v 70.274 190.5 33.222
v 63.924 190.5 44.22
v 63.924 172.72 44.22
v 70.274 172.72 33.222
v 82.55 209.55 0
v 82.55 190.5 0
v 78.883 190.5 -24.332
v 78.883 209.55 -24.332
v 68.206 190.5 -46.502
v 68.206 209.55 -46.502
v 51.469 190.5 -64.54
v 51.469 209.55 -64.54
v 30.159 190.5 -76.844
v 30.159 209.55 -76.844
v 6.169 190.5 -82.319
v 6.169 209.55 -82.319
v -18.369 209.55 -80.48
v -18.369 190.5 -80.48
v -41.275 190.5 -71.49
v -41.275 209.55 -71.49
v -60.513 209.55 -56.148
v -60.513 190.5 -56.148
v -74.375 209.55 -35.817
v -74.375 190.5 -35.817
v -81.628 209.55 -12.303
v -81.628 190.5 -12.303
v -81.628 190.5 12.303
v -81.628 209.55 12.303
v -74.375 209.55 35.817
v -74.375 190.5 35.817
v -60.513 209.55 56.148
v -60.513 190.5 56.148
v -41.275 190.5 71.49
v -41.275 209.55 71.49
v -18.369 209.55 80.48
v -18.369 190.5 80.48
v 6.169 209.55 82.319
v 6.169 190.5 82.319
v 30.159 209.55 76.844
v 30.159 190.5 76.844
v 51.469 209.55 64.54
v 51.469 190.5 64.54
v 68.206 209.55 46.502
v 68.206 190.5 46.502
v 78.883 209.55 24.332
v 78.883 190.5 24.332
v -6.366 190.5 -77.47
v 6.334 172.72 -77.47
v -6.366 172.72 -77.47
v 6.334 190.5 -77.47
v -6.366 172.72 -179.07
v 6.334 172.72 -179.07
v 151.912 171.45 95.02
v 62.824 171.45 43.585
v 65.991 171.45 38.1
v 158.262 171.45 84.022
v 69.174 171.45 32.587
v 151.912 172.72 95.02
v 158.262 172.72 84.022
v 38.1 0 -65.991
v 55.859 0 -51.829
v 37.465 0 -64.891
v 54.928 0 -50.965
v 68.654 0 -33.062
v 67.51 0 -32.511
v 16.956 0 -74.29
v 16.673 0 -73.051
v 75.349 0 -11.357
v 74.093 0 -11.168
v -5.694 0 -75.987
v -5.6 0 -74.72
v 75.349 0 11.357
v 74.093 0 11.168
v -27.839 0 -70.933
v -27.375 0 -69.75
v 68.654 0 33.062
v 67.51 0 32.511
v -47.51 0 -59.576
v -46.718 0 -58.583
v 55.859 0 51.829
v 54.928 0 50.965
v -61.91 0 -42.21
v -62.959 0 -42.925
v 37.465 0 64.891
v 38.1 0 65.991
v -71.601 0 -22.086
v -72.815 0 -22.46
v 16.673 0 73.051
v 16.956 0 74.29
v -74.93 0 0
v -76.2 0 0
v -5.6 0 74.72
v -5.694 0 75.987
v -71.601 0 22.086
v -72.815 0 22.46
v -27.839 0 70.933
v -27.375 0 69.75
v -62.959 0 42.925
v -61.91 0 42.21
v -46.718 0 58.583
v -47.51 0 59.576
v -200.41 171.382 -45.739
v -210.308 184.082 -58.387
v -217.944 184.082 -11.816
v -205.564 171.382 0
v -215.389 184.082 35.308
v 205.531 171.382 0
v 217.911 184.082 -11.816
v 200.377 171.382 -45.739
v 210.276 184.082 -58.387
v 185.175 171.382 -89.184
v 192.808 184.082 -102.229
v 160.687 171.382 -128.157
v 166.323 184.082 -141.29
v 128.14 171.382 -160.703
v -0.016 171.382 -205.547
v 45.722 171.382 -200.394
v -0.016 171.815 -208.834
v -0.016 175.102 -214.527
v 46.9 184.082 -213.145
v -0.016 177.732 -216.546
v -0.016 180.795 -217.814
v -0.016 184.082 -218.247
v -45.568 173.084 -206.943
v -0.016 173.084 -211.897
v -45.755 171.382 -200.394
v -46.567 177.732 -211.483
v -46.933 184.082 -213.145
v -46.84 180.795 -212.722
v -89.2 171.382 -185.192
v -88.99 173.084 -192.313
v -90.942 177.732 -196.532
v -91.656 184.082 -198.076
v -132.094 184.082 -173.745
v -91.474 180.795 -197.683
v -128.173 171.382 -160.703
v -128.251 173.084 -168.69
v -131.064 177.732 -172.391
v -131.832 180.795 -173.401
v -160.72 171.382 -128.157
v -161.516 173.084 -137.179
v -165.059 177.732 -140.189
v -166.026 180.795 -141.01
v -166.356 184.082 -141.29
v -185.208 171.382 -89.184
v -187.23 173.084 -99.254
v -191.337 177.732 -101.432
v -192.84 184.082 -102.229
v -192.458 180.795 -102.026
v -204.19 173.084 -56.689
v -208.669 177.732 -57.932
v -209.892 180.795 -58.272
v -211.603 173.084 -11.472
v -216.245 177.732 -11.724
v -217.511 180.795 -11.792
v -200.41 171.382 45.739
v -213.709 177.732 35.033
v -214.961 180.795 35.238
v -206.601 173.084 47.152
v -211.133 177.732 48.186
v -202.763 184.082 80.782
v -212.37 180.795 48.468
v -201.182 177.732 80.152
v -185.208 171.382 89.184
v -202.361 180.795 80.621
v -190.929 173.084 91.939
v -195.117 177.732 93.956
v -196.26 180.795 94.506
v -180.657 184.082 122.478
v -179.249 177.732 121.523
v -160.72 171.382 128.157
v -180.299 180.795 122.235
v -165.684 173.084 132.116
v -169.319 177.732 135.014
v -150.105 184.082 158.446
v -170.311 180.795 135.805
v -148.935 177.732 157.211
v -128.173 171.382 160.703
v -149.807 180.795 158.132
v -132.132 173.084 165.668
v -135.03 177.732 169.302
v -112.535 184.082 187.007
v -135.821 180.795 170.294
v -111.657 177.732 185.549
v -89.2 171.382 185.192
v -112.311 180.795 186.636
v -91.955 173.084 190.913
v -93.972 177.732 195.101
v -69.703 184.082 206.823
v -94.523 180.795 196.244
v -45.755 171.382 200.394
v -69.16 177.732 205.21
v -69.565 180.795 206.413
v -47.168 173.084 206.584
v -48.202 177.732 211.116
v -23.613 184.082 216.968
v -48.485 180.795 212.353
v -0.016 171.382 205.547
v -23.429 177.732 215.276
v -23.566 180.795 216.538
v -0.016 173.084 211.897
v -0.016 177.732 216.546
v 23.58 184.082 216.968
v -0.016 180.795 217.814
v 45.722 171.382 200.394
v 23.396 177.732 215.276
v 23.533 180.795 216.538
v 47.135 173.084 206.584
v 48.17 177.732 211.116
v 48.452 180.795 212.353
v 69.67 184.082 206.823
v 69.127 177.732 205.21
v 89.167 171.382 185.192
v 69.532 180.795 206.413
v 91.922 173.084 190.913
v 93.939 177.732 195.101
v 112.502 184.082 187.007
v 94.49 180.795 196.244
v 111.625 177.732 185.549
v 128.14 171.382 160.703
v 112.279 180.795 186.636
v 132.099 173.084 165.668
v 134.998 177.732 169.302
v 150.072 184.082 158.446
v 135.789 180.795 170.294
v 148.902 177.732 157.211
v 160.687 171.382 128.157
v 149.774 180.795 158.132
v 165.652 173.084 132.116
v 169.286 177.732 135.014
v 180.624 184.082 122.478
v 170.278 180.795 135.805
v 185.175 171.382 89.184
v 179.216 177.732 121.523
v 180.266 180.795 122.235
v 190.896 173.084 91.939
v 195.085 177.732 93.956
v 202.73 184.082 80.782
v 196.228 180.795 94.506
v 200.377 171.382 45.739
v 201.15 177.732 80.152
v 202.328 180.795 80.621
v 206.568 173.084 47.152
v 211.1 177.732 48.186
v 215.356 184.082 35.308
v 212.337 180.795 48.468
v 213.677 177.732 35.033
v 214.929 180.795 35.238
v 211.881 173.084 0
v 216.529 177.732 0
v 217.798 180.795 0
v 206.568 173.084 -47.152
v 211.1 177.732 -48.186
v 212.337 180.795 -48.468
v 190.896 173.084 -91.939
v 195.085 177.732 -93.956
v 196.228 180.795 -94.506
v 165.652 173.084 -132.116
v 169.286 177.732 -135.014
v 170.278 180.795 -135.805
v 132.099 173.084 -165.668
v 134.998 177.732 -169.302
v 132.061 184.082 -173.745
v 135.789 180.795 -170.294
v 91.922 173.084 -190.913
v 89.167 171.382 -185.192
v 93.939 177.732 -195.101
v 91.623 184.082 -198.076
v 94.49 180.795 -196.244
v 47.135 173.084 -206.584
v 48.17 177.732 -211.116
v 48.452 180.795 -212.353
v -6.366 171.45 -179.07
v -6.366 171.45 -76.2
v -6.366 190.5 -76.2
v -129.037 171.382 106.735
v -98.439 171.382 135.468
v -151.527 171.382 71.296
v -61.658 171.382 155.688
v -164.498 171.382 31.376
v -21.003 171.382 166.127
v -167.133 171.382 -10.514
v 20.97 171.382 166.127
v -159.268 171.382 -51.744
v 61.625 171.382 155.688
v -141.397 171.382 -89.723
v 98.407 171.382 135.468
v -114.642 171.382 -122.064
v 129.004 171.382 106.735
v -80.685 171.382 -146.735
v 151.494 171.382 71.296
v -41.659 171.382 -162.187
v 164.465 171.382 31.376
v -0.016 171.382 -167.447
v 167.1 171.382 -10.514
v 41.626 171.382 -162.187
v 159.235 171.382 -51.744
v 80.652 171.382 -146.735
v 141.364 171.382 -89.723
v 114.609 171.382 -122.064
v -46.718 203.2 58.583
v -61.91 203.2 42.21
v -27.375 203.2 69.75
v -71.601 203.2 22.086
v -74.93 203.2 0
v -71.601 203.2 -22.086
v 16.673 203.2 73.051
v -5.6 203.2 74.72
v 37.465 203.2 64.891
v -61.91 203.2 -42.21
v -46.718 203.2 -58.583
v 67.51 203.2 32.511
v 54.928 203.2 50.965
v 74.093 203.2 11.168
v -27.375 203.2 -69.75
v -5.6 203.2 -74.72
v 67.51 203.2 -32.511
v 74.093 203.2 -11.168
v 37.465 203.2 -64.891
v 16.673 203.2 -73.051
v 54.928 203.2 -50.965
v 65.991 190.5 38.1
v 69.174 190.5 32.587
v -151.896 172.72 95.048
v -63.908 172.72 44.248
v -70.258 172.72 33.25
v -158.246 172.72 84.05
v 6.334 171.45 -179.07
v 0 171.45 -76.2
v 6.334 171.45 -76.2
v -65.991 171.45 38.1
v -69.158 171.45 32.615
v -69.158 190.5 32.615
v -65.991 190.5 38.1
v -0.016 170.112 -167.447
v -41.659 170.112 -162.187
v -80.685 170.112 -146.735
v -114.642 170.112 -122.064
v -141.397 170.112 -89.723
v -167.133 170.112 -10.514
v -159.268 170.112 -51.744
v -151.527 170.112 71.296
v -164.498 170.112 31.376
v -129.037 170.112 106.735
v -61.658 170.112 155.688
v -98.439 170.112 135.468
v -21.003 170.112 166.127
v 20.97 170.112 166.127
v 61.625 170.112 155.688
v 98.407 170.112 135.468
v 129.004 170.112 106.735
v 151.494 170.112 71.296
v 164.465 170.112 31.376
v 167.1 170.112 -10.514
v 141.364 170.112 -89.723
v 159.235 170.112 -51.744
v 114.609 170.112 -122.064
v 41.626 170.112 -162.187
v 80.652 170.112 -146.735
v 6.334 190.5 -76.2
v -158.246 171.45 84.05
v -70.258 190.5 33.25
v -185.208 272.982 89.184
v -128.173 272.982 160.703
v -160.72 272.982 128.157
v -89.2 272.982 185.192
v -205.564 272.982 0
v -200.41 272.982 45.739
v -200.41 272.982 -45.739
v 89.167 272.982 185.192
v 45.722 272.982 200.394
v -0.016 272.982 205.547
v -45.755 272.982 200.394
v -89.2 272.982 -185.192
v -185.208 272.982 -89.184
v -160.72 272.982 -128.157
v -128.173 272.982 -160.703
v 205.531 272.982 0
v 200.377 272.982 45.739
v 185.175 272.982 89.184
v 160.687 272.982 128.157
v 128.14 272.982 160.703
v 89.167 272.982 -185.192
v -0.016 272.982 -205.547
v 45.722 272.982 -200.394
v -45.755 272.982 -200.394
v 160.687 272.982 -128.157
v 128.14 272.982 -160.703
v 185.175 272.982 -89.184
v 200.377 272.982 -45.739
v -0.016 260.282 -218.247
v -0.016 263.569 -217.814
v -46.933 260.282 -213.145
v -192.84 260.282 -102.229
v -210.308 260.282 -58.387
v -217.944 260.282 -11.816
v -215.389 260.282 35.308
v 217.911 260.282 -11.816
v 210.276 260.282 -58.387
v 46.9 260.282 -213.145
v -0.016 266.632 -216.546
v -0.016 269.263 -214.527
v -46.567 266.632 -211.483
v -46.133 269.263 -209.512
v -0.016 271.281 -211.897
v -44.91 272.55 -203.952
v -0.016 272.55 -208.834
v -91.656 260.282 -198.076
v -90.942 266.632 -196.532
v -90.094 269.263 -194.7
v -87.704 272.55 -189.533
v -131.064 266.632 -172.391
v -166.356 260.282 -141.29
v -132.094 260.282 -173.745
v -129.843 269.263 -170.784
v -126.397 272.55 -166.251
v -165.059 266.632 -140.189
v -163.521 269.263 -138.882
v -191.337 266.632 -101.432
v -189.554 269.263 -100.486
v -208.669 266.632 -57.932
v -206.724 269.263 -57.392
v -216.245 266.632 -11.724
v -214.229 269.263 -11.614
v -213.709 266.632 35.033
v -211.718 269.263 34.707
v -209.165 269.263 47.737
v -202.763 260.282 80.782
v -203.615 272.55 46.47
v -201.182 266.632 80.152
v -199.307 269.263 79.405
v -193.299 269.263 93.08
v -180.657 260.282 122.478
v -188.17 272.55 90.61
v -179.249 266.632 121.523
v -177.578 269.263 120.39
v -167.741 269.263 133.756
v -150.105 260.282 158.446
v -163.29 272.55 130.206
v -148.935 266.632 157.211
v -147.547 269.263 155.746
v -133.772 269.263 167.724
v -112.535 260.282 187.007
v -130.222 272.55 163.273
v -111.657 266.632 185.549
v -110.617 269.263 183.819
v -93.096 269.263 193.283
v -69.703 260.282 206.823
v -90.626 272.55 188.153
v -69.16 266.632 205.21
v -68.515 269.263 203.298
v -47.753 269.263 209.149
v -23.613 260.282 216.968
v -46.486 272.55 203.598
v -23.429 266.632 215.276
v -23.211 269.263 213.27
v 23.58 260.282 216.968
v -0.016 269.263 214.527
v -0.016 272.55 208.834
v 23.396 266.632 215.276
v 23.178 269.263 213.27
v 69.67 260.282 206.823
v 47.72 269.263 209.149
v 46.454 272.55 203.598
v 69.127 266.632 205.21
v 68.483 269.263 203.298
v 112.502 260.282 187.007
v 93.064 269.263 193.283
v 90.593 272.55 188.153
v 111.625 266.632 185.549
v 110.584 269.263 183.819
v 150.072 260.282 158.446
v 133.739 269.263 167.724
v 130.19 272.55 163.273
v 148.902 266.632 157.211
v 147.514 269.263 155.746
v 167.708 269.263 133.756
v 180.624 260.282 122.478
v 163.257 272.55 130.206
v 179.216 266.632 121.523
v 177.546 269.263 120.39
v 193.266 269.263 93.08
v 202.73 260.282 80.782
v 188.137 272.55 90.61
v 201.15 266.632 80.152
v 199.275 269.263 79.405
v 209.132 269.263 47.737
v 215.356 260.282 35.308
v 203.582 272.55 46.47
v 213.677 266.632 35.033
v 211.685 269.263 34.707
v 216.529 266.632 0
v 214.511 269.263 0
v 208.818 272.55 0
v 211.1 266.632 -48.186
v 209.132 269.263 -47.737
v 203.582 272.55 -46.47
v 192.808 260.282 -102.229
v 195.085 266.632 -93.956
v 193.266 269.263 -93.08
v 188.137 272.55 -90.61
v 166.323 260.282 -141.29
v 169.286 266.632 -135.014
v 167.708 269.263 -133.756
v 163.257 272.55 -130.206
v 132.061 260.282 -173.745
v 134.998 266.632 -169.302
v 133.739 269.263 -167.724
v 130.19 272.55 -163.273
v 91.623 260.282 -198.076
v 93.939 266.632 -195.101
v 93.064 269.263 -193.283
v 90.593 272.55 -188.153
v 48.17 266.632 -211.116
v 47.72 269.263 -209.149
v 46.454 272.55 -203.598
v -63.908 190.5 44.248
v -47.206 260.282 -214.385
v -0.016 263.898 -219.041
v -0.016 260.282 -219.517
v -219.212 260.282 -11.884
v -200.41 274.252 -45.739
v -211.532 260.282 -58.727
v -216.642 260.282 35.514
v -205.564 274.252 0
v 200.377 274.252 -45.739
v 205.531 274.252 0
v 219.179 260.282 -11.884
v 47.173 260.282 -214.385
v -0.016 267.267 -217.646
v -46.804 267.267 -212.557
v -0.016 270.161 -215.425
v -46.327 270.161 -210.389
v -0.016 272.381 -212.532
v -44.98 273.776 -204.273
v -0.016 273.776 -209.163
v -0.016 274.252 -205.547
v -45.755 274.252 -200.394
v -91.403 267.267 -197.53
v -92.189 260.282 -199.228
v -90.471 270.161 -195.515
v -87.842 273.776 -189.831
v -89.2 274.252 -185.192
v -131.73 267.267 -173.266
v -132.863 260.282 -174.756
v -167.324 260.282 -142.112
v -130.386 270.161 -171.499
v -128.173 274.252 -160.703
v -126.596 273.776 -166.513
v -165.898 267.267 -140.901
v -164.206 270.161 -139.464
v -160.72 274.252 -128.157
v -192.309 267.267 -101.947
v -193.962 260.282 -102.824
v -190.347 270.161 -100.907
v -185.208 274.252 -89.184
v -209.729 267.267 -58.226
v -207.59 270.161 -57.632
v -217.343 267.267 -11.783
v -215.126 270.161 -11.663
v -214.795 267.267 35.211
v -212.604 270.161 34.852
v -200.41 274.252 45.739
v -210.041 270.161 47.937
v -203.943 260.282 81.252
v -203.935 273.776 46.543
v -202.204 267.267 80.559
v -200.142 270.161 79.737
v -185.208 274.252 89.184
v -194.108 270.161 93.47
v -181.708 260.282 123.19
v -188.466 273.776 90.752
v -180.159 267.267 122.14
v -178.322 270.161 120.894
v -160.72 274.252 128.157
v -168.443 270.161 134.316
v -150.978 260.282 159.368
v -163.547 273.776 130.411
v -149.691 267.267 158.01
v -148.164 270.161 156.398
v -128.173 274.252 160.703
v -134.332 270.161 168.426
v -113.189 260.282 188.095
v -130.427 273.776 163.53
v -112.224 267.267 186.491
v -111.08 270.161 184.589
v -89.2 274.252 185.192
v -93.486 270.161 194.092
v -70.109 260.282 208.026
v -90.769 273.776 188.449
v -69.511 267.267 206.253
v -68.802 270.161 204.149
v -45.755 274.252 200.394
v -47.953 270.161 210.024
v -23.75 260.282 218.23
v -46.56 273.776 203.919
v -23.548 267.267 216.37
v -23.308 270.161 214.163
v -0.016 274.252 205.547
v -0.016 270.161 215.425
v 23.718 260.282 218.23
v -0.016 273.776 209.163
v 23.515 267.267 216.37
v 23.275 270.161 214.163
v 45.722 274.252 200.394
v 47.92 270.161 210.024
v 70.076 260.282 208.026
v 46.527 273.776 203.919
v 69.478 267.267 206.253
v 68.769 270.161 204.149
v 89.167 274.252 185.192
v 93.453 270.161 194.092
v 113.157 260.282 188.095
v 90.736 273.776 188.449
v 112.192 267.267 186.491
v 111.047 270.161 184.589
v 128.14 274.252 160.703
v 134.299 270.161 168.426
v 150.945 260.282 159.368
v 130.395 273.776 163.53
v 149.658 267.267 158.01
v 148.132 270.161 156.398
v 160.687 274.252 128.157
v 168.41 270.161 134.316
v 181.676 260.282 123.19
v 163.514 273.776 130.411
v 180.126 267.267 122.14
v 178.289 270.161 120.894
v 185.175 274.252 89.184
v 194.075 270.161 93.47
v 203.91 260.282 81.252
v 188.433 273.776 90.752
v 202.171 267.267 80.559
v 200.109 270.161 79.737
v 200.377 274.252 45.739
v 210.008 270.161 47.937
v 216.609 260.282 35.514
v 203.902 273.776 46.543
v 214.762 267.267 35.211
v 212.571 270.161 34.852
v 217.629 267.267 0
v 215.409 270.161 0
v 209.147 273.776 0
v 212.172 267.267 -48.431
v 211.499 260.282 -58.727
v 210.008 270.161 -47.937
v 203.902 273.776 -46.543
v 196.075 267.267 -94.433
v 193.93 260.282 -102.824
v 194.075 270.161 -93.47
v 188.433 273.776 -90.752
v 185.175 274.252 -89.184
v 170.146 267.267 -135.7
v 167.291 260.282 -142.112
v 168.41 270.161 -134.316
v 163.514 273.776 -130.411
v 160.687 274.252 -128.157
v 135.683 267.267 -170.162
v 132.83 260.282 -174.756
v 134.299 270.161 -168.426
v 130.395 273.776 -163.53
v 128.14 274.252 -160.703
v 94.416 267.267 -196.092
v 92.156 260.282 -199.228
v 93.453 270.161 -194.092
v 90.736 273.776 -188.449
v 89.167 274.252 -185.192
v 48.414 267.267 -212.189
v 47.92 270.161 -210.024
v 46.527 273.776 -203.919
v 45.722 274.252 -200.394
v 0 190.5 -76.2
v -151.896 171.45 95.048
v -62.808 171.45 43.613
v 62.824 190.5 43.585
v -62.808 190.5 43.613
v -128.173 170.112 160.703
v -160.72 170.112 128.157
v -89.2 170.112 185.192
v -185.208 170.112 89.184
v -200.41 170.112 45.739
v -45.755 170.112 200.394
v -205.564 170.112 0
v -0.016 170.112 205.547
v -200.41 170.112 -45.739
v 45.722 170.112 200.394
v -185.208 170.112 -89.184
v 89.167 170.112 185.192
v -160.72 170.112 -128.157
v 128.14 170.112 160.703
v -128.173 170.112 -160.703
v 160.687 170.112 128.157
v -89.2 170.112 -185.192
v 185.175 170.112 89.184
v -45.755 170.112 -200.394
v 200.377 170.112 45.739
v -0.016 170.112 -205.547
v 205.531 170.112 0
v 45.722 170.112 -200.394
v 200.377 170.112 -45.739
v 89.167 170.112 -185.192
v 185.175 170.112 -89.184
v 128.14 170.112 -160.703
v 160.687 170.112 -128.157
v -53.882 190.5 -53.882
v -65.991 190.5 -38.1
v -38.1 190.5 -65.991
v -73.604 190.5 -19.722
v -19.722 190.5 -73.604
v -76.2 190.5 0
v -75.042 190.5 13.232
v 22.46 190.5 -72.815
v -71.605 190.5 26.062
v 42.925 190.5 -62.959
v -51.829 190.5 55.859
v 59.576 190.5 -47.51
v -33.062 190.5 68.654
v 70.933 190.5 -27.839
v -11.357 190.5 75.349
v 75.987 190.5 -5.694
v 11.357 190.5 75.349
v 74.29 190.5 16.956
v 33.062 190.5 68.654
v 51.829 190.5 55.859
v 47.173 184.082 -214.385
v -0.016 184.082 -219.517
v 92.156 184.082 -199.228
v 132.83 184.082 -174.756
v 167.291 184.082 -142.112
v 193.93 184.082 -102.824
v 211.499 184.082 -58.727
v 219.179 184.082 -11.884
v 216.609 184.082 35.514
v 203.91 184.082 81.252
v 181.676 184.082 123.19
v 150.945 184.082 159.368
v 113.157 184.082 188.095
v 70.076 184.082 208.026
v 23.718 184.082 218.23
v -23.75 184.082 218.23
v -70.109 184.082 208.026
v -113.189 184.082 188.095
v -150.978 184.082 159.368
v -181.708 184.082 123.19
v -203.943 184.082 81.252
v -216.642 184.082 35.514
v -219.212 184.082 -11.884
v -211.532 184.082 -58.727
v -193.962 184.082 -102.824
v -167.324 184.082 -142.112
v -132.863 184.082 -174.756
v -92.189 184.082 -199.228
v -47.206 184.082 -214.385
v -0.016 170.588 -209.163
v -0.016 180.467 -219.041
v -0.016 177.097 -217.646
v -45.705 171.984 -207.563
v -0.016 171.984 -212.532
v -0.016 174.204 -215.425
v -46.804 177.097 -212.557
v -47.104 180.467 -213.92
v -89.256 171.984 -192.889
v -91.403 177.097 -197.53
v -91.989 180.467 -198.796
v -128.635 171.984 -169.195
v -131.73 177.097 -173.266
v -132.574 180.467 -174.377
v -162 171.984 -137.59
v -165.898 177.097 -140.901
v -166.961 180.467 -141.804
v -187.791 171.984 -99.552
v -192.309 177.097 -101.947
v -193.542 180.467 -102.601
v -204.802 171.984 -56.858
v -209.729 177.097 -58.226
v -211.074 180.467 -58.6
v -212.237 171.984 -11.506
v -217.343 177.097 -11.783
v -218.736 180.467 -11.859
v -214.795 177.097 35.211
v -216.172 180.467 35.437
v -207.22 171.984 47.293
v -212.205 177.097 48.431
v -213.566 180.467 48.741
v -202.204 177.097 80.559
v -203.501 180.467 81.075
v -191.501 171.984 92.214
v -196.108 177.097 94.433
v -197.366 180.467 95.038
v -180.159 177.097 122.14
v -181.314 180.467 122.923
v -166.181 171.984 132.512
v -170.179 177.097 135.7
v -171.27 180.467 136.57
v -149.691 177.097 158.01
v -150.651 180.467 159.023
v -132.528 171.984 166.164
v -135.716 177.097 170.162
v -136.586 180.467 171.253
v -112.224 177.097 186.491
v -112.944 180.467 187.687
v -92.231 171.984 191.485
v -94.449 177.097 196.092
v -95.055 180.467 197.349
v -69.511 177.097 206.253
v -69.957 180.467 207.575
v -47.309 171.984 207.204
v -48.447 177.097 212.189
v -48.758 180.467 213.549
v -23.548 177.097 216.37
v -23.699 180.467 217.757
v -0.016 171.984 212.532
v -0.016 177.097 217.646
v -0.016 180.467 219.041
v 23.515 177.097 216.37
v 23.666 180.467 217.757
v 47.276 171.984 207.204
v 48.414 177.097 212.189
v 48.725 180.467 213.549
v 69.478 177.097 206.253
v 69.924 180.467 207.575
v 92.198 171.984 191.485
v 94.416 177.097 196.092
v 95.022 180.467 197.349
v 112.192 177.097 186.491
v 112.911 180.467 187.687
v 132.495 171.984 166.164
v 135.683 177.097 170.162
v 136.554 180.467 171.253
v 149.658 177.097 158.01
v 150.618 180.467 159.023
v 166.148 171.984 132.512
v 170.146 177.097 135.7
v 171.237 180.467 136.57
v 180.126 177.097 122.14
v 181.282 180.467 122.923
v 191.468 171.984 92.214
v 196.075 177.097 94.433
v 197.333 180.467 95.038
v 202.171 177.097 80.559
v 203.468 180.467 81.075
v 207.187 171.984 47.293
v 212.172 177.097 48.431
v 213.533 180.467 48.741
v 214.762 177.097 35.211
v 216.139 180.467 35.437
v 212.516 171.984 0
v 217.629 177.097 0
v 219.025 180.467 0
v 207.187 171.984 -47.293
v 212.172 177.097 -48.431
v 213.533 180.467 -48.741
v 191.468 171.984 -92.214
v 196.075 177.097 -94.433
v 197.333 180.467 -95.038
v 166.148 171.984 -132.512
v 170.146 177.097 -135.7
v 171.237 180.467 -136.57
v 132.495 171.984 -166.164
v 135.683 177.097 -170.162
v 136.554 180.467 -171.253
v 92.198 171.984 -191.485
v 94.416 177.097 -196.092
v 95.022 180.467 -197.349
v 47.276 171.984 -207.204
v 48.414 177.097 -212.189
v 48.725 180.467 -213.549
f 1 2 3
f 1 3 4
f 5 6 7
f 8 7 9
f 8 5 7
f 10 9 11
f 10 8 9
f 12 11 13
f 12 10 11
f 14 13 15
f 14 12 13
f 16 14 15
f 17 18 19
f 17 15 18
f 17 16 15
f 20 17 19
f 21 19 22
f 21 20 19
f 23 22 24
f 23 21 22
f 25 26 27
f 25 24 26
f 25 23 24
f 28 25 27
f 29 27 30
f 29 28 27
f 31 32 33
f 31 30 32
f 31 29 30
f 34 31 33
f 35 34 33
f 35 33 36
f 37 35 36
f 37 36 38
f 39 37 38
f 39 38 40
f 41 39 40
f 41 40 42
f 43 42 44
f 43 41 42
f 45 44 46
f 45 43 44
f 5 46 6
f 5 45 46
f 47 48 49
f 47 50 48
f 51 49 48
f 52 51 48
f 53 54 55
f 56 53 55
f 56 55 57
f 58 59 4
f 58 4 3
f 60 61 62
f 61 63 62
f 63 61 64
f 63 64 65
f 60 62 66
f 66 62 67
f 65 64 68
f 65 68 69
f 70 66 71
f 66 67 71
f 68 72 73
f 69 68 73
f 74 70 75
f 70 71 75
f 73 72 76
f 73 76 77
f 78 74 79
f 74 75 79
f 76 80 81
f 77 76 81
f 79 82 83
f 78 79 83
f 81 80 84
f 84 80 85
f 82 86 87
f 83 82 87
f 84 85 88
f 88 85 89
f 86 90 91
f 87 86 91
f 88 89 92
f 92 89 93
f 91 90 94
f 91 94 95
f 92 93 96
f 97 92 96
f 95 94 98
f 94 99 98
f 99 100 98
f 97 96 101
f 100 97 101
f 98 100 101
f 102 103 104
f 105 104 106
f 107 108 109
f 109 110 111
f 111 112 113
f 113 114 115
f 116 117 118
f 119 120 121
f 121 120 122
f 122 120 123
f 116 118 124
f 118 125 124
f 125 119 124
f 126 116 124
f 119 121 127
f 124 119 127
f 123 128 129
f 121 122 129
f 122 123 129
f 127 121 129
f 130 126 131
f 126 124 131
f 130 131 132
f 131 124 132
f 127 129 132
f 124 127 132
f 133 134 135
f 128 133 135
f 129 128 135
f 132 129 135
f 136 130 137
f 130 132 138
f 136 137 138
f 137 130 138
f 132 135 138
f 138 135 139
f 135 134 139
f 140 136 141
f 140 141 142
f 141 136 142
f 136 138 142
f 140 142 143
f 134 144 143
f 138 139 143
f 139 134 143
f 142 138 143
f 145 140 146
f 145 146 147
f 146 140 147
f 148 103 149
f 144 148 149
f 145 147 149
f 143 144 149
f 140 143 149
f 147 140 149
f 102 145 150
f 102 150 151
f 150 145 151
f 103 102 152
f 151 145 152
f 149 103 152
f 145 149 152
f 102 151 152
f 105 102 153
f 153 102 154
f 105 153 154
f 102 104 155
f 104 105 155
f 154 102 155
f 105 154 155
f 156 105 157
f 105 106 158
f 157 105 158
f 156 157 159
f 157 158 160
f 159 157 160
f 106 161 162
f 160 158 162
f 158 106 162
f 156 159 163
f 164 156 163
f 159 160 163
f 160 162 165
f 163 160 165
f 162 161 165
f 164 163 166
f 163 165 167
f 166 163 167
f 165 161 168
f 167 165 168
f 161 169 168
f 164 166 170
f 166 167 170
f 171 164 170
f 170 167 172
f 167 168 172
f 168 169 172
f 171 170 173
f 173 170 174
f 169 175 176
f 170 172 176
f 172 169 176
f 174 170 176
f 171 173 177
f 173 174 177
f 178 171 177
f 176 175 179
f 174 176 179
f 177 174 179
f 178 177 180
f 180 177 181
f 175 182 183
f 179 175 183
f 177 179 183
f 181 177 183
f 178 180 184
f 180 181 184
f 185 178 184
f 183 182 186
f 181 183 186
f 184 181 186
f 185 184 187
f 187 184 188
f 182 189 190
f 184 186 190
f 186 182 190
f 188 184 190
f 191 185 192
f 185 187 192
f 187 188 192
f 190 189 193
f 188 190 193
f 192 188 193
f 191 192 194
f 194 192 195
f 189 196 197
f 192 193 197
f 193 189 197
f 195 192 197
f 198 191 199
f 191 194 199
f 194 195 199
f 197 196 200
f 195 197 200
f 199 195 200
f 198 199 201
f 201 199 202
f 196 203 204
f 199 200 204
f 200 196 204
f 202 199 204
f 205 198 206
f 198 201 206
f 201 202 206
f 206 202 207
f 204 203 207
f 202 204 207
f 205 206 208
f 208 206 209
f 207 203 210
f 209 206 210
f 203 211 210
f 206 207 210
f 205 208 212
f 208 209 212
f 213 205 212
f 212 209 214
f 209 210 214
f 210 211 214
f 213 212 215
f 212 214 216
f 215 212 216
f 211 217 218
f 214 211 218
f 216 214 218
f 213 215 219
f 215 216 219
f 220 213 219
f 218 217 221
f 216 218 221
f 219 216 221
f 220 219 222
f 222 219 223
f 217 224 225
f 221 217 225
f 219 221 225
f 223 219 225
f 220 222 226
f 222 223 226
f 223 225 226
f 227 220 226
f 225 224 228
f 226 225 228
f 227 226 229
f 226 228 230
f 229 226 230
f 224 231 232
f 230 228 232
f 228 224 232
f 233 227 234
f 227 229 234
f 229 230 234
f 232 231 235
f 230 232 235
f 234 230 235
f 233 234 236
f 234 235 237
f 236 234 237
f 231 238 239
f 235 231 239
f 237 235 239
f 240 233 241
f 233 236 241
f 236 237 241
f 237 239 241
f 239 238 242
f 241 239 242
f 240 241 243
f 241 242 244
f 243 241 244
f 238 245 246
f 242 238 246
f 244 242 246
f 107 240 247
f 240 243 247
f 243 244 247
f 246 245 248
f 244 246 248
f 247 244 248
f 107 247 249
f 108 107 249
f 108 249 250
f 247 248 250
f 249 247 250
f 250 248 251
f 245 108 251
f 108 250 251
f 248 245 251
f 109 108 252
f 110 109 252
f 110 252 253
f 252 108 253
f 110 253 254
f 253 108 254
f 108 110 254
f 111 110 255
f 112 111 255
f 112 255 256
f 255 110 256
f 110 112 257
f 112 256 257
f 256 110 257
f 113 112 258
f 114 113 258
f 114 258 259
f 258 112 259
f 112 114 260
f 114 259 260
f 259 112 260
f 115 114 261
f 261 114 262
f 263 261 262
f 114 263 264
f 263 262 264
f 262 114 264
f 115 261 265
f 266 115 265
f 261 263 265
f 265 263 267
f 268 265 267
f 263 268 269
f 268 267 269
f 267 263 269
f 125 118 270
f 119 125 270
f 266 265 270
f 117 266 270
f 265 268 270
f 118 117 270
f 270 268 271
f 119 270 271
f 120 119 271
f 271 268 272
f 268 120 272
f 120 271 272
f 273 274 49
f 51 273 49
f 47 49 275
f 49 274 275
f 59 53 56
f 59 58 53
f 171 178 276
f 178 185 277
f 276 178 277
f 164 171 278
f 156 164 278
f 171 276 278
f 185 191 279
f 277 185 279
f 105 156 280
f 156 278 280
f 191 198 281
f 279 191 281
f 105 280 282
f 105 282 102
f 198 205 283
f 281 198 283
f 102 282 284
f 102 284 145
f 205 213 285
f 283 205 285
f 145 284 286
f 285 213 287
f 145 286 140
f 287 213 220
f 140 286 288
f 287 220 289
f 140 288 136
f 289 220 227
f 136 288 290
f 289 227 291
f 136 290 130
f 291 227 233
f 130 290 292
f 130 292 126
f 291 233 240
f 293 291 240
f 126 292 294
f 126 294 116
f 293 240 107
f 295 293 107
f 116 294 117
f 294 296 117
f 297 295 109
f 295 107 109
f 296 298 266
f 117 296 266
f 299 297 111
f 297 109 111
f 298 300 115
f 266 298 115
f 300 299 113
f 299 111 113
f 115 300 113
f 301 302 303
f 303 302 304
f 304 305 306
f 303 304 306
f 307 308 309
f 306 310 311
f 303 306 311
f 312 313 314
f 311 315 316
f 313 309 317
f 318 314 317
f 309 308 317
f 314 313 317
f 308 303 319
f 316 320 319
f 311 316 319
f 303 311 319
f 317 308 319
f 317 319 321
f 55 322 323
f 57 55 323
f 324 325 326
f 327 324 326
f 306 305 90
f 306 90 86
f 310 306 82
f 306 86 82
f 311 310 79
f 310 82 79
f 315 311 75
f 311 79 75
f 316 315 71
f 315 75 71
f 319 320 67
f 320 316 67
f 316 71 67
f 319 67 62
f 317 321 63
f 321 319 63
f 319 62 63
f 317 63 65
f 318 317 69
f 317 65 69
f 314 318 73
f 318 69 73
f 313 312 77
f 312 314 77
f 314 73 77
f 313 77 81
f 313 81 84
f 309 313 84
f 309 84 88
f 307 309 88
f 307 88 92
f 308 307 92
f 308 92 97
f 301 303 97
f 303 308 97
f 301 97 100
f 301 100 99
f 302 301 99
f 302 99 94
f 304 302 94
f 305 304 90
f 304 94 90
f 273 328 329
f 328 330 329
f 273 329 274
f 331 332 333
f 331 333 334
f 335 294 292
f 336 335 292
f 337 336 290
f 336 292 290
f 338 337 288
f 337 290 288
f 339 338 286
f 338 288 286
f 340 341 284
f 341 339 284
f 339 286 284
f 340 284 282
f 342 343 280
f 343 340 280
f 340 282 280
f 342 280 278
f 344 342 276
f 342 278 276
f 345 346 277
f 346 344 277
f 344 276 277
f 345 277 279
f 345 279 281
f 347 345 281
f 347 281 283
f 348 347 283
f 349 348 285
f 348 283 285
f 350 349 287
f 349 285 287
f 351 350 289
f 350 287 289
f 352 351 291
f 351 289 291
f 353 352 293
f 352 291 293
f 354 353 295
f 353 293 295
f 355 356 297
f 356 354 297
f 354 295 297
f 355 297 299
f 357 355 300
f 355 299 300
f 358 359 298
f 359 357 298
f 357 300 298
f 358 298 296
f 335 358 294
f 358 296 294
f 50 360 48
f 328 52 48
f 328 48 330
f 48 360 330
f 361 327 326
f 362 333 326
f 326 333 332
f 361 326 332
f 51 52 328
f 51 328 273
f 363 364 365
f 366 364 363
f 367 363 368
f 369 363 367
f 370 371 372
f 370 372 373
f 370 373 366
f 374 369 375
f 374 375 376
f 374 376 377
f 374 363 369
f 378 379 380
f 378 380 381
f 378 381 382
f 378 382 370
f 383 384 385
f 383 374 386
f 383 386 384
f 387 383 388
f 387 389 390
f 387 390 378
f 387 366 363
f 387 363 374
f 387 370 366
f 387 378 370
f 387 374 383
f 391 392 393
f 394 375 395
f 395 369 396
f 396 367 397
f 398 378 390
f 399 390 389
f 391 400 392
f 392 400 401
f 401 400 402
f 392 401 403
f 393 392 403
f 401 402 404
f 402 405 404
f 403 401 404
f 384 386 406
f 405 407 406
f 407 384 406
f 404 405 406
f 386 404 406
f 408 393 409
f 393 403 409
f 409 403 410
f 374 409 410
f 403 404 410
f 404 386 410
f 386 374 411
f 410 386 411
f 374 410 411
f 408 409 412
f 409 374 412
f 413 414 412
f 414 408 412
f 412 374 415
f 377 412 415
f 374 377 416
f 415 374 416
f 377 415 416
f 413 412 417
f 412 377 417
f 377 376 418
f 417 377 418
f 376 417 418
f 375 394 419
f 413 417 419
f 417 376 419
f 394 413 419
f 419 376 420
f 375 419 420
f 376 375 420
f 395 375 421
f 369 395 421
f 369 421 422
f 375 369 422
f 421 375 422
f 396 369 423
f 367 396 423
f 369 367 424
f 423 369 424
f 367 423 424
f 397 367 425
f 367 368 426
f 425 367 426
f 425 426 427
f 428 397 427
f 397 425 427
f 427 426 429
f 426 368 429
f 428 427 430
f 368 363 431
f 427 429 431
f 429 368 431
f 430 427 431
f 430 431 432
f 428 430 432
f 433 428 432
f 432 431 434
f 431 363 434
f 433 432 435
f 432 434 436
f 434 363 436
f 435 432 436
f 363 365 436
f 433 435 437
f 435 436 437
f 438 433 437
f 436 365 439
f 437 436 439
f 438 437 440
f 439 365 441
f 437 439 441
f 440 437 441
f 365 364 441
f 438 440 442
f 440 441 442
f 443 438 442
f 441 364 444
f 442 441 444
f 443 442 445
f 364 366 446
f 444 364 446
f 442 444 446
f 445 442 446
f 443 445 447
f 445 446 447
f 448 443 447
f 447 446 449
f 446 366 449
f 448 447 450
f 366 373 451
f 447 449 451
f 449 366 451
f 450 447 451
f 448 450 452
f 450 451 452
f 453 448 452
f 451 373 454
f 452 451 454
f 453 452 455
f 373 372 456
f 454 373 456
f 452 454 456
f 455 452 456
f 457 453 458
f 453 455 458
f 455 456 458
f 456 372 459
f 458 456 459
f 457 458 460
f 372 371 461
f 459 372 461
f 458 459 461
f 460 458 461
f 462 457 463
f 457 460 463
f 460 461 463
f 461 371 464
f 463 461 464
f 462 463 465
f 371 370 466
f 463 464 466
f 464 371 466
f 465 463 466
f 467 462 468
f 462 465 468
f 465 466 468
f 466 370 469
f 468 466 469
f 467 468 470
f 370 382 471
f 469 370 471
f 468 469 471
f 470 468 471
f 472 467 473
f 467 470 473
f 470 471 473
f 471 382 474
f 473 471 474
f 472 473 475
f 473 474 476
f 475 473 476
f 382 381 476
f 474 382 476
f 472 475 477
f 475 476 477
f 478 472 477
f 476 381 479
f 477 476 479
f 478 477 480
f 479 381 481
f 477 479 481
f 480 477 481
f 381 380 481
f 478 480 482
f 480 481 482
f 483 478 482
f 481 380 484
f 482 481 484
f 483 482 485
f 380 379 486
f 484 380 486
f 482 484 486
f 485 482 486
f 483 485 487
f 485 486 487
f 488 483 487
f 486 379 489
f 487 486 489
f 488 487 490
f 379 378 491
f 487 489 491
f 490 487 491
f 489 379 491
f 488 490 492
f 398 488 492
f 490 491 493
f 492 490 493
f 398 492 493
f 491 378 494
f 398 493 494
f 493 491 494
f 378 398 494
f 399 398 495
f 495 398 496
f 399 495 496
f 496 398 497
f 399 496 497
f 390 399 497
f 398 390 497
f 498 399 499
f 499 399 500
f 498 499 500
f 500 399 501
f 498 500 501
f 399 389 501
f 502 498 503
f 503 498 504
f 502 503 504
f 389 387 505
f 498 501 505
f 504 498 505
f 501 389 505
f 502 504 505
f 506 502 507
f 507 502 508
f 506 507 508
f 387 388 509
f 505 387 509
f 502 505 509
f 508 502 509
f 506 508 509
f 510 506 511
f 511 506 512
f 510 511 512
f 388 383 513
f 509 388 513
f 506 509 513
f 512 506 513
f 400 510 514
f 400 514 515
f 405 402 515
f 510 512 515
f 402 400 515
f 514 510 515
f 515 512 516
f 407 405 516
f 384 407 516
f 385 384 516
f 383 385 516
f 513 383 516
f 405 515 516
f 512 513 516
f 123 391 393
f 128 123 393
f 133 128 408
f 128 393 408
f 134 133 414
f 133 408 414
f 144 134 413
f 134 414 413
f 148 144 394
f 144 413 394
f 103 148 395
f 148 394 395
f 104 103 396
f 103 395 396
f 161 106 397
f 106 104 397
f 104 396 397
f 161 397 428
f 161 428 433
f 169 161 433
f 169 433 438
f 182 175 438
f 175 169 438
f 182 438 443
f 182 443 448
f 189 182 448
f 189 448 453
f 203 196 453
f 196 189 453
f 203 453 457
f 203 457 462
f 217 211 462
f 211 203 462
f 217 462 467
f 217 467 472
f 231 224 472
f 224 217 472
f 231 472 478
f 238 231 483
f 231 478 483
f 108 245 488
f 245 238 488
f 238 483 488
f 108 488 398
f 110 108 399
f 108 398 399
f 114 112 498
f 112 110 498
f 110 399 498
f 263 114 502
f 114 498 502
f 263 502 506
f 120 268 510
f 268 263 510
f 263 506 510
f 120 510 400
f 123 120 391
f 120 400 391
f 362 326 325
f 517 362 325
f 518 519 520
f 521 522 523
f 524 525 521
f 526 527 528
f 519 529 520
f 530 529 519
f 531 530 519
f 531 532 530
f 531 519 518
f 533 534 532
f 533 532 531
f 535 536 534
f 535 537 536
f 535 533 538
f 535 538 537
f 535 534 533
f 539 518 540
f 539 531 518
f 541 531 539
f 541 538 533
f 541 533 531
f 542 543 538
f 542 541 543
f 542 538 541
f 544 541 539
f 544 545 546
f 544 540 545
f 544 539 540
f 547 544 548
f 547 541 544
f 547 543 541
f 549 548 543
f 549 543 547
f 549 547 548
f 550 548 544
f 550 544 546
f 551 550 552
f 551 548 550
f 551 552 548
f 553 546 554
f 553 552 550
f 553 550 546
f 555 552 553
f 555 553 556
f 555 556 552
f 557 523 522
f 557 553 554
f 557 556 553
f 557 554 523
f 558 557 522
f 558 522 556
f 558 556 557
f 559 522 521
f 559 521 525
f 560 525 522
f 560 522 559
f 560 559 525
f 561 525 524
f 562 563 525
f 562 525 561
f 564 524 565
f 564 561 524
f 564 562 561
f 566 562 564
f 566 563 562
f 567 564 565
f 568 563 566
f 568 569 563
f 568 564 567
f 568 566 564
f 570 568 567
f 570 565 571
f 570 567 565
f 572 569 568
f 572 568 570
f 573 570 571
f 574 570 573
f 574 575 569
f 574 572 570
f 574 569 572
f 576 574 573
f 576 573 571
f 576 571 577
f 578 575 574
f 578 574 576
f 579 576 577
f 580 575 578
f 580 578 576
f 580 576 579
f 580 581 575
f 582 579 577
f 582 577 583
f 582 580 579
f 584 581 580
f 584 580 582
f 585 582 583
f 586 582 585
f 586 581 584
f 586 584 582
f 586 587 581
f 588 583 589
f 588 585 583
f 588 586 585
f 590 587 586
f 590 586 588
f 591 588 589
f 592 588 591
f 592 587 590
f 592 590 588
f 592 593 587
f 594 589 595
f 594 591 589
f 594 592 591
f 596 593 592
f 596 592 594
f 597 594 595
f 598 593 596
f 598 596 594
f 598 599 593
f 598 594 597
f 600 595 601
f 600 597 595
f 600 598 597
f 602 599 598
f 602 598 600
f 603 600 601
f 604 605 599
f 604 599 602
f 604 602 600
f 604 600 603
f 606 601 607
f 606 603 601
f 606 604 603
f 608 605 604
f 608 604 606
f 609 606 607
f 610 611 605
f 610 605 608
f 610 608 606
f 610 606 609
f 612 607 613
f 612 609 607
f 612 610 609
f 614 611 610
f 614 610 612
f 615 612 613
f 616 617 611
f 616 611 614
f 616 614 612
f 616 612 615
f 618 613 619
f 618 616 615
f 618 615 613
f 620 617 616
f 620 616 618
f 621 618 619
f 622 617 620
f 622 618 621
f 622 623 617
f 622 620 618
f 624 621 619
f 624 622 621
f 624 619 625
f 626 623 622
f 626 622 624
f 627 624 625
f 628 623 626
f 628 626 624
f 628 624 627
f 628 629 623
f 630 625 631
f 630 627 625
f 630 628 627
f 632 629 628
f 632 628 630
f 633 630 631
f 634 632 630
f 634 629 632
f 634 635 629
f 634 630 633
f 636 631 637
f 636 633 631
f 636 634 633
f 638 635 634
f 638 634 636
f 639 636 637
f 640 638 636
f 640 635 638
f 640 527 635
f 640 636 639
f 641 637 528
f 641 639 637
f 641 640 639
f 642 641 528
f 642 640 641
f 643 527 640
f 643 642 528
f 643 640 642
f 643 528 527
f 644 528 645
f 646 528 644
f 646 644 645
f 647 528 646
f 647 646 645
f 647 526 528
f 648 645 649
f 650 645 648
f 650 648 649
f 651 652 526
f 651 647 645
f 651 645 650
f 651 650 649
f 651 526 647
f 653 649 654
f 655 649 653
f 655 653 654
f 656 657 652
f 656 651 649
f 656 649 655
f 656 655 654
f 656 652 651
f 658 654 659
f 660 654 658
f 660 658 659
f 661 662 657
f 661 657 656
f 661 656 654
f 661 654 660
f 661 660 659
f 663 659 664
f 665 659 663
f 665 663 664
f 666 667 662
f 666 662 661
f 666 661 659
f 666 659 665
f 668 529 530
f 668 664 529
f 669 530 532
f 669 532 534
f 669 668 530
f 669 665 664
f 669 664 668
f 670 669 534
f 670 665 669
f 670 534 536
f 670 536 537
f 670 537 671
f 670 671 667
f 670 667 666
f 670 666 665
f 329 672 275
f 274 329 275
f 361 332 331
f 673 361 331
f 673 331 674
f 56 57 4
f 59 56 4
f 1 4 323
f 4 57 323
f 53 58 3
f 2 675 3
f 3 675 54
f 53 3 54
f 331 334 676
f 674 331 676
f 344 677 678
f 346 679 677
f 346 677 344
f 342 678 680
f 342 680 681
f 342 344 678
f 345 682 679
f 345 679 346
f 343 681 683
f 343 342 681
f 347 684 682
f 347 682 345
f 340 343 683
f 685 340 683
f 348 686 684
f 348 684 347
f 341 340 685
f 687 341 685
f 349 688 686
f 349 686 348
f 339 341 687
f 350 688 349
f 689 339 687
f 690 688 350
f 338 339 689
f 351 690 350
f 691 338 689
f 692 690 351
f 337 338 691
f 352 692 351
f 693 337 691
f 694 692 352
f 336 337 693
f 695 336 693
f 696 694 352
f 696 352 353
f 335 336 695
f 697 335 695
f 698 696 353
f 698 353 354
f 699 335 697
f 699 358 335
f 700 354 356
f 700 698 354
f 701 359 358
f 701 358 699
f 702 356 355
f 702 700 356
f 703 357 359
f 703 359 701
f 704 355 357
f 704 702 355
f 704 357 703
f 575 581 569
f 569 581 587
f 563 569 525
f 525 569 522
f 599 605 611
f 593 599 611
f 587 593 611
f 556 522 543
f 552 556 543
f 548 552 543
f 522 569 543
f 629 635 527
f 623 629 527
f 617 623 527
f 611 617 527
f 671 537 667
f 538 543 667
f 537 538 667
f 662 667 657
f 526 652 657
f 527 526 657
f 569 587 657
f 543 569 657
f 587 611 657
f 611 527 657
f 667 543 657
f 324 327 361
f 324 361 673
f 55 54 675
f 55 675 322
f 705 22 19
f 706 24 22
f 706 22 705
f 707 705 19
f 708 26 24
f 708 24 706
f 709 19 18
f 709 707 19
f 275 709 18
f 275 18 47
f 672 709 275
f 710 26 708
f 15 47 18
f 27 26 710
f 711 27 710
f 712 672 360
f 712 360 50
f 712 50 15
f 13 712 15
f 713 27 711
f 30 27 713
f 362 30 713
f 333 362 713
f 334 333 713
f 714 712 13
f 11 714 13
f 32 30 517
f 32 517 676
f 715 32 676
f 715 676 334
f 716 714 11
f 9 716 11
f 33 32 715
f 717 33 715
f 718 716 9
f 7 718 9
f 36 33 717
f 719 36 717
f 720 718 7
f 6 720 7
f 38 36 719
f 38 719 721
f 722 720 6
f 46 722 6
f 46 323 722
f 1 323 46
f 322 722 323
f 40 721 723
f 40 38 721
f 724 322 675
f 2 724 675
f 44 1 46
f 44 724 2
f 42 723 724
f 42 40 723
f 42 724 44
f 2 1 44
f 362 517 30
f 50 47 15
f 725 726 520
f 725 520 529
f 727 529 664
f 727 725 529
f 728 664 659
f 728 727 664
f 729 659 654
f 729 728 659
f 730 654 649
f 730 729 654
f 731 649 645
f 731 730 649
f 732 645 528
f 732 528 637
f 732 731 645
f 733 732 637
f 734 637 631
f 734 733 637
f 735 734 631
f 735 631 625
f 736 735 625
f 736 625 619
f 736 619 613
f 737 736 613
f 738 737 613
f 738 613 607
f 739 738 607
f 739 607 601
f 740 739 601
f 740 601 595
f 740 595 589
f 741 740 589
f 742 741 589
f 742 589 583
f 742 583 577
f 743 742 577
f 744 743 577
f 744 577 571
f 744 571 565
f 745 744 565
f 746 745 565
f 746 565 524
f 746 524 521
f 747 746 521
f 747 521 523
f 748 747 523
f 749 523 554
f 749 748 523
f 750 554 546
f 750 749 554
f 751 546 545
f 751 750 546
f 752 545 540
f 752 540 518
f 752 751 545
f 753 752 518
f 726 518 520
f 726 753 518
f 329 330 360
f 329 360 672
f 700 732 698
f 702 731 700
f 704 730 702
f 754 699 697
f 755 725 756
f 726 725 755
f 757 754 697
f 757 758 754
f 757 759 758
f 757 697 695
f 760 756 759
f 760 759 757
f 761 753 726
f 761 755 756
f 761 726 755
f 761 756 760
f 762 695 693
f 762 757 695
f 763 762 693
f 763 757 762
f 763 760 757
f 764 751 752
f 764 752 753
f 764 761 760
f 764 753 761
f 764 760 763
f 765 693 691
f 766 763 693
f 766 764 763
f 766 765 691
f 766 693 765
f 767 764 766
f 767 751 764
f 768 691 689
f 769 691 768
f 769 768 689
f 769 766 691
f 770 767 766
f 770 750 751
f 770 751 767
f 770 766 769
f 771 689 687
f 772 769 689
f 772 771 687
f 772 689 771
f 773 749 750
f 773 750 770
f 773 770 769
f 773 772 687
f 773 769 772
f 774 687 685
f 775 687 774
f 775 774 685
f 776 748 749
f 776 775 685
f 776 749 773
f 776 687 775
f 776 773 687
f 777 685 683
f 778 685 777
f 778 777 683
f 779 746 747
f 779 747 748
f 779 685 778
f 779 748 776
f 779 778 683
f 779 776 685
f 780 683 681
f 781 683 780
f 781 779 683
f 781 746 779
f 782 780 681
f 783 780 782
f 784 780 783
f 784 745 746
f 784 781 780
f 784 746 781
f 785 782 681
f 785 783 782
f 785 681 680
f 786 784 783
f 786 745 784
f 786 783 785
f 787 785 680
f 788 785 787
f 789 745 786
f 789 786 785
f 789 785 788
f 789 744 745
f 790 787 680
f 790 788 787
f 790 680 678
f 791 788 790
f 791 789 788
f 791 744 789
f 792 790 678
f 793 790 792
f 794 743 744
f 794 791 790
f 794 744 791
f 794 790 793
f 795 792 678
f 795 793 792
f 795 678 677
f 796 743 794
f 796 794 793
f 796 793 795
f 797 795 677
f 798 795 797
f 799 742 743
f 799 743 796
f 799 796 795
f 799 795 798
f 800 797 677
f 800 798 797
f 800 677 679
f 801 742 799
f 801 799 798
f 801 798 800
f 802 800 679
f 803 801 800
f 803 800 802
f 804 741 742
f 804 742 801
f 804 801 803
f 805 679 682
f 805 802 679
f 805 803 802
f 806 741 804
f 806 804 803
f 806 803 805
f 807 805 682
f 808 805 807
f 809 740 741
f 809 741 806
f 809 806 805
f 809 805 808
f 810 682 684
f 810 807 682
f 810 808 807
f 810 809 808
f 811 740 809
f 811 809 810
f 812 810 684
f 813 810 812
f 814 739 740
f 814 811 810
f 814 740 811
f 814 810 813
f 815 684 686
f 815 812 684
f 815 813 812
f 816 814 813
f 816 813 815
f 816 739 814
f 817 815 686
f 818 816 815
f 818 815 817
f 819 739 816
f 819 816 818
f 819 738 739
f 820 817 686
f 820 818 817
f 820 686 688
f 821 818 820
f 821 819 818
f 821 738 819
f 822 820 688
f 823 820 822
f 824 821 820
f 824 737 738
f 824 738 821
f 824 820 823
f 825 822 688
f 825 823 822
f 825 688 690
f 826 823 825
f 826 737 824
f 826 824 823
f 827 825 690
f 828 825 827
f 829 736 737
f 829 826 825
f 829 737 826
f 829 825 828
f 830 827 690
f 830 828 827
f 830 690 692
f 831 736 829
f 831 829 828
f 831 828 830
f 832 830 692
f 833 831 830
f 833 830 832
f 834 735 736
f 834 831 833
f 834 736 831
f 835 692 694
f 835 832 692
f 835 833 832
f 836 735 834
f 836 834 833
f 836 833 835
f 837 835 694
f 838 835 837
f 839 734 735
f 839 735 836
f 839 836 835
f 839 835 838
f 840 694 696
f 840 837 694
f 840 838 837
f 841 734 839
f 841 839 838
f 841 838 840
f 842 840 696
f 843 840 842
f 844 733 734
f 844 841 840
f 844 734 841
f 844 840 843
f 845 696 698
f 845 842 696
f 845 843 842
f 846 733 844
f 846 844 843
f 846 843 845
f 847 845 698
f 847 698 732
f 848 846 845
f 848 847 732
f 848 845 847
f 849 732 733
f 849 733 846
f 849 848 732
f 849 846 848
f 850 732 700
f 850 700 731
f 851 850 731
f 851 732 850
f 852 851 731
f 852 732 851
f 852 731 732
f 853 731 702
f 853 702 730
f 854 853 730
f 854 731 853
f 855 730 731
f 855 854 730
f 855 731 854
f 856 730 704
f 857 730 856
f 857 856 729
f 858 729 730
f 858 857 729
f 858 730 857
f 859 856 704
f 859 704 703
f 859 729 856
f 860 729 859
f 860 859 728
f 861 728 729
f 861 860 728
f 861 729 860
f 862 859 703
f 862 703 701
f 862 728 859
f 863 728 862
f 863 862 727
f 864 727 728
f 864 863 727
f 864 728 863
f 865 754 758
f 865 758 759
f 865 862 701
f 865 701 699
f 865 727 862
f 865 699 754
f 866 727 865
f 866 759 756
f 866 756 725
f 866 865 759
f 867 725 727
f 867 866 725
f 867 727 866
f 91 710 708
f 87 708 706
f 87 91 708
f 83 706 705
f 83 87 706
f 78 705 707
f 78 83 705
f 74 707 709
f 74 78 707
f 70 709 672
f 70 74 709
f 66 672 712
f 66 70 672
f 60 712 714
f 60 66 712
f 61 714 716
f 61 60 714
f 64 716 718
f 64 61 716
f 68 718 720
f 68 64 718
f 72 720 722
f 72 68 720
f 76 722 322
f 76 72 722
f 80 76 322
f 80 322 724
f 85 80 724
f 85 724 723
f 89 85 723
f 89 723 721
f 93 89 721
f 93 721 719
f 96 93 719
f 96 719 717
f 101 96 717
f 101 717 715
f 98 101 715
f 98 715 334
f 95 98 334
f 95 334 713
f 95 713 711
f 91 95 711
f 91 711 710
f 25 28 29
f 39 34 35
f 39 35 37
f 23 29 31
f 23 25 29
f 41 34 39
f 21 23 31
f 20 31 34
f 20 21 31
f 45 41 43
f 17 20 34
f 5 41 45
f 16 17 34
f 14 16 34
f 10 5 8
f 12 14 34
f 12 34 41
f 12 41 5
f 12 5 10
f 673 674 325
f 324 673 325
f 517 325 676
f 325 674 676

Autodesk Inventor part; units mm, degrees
ref_plane "YZ Plane" through (0, 0, 0) normal (1, 0, 0) x (0, 1, 0)
sketch "Sketch1" plane through (0, 0, 0) normal (0, 1, 0) x (-1, 0, 0)
  circle A0 centre (0, 0) radius 76.2
  circle A1 centre (0, 0) radius 74.93
  dimension "d0" = 152.4
  dimension "d1" = 1.27
extrude "Extrusion1" add sketch "Sketch1" along normal blind 203.2
sketch "Sketch2" plane through (0, 203.2, 0) normal (0, 1, 0) x (1, 0, 0)
  circle A0 centre (0, 0) radius 74.93 projected
  circle A1 centre (0, 0) radius 76.2 projected
  point P0 (0, 76.2)
ref_plane "Work Plane1" through (0, 203.2, -76.2) normal (0, 0, -1) x (-1, 0, 0)
sketch "Sketch3" plane through (0, 203.2, -76.2) normal (0, 0, -1) x (-1, 0, 0)
  line L0 (-6.3336, -31.75) -> (6.3664, -31.75)
  line L1 (6.3664, -31.75) -> (6.3664, -12.7)
  line L2 (6.3664, -12.7) -> (-6.3336, -12.7)
  line L3 (-6.3336, -12.7) -> (-6.3336, -31.75)
  line L4 (76.2, 0) -> (-76.2, 0) projected
  point P0 (0, -203.2)
  point P1 (0.0164, -12.7)
  dimension "d4" = 12.7
  dimension "d5" = 19.05
  dimension "d6" = 12.7
extrude "Extrusion2" add sketch "Sketch3" along normal blind 1.27
sketch "Sketch4" plane through (0, 203.2, -77.47) normal (0, 0, -1) x (-1, 0, 0)
  line L0 (-6.3336, -31.75) -> (6.3664, -31.75) projected
  line L1 (6.3664, -31.75) -> (6.3664, -12.7) projected
  line L2 (-6.3336, -31.75) -> (6.3664, -31.75)
  line L3 (6.3664, -31.75) -> (6.3664, -30.48)
  line L4 (6.3664, -30.48) -> (-6.3336, -30.48)
  line L5 (-6.3336, -30.48) -> (-6.3336, -31.75)
  point P0 (0, -203.2)
  dimension "d9" = 1.27
extrude "Extrusion3" add sketch "Sketch4" along normal blind 101.6
pattern_circular "Circular Pattern1" count 3 over 360 about axis through (0, -10, 0) along (0, 1, 0) of "Extrusion2", "Extrusion3"
ref_plane "Work Plane5" through (-0.0164, 171.45, -76.2) normal (1, 0, 0) x (0, 0, -1)
sketch "Sketch8" plane through (-0.0164, 171.45, -76.2) normal (1, 0, 0) x (0, 0, -1)
  line L0 (91.2472, -0.0676) -> (129.3472, -0.0676)
  line L1 (142.0472, 12.6324) -> (142.0472, 88.8324)
  line L2 (129.3472, 101.5324) -> (-76.2, 101.5324)
  arc A0 (142.0472, 88.8324) -> (129.3472, 101.5324) centre (129.3472, 88.8324) ccw
  arc A1 (129.3472, -0.0676) -> (142.0472, 12.6324) centre (129.3472, 12.6324) ccw
  line L3 (-76.2, 102.8024) -> (129.3472, 102.8024)
  arc A2 (143.3172, 88.8324) -> (129.3472, 102.8024) centre (129.3472, 88.8324) ccw
  line L4 (143.3172, 88.8324) -> (143.3172, 12.6324)
  arc A3 (129.3472, -1.3376) -> (143.3172, 12.6324) centre (129.3472, 12.6324) ccw
  line L5 (129.3472, -1.3376) -> (91.2472, -1.3376)
  line L6 (-76.2, 101.5324) -> (-76.2, -188.2709) construction
  line L7 (91.2472, -1.3376) -> (91.2472, -0.0676)
  line L8 (-76.2, 101.5324) -> (-76.2, 102.8024)
  point P0 (-76.2, -171.45)
  point P1 (142.0472, -0.0676)
  point P2 (142.0472, 101.5324)
  dimension "d26" = 50.8
  dimension "d27" = 101.6
  dimension "d28" = 12.7
  dimension "d29" = 1.27
revolve "Revolution3" add sketch "Sketch8" angle 360 about axis through (-0.0164, 272.9824, 0) along (0, -1, 0)
sketch "Sketch10" plane through (0, 203.2, 0) normal (0, 1, 0) x (1, 0, 0)
  circle A0 centre (0, 0) radius 82.55
  dimension "d34" = 165.1
extrude "Extrusion5" add sketch "Sketch10" along normal blind 6.35
sketch "Sketch11" plane through (0, 203.2, 0) normal (0, -1, 0) x (1, 0, 0)
  circle A0 centre (0, 0) radius 82.55 projected
  circle A1 centre (0, 0) radius 76.2 projected
extrude "Extrusion6" add sketch "Sketch11" along normal blind 12.7
properties part number "chimney"
